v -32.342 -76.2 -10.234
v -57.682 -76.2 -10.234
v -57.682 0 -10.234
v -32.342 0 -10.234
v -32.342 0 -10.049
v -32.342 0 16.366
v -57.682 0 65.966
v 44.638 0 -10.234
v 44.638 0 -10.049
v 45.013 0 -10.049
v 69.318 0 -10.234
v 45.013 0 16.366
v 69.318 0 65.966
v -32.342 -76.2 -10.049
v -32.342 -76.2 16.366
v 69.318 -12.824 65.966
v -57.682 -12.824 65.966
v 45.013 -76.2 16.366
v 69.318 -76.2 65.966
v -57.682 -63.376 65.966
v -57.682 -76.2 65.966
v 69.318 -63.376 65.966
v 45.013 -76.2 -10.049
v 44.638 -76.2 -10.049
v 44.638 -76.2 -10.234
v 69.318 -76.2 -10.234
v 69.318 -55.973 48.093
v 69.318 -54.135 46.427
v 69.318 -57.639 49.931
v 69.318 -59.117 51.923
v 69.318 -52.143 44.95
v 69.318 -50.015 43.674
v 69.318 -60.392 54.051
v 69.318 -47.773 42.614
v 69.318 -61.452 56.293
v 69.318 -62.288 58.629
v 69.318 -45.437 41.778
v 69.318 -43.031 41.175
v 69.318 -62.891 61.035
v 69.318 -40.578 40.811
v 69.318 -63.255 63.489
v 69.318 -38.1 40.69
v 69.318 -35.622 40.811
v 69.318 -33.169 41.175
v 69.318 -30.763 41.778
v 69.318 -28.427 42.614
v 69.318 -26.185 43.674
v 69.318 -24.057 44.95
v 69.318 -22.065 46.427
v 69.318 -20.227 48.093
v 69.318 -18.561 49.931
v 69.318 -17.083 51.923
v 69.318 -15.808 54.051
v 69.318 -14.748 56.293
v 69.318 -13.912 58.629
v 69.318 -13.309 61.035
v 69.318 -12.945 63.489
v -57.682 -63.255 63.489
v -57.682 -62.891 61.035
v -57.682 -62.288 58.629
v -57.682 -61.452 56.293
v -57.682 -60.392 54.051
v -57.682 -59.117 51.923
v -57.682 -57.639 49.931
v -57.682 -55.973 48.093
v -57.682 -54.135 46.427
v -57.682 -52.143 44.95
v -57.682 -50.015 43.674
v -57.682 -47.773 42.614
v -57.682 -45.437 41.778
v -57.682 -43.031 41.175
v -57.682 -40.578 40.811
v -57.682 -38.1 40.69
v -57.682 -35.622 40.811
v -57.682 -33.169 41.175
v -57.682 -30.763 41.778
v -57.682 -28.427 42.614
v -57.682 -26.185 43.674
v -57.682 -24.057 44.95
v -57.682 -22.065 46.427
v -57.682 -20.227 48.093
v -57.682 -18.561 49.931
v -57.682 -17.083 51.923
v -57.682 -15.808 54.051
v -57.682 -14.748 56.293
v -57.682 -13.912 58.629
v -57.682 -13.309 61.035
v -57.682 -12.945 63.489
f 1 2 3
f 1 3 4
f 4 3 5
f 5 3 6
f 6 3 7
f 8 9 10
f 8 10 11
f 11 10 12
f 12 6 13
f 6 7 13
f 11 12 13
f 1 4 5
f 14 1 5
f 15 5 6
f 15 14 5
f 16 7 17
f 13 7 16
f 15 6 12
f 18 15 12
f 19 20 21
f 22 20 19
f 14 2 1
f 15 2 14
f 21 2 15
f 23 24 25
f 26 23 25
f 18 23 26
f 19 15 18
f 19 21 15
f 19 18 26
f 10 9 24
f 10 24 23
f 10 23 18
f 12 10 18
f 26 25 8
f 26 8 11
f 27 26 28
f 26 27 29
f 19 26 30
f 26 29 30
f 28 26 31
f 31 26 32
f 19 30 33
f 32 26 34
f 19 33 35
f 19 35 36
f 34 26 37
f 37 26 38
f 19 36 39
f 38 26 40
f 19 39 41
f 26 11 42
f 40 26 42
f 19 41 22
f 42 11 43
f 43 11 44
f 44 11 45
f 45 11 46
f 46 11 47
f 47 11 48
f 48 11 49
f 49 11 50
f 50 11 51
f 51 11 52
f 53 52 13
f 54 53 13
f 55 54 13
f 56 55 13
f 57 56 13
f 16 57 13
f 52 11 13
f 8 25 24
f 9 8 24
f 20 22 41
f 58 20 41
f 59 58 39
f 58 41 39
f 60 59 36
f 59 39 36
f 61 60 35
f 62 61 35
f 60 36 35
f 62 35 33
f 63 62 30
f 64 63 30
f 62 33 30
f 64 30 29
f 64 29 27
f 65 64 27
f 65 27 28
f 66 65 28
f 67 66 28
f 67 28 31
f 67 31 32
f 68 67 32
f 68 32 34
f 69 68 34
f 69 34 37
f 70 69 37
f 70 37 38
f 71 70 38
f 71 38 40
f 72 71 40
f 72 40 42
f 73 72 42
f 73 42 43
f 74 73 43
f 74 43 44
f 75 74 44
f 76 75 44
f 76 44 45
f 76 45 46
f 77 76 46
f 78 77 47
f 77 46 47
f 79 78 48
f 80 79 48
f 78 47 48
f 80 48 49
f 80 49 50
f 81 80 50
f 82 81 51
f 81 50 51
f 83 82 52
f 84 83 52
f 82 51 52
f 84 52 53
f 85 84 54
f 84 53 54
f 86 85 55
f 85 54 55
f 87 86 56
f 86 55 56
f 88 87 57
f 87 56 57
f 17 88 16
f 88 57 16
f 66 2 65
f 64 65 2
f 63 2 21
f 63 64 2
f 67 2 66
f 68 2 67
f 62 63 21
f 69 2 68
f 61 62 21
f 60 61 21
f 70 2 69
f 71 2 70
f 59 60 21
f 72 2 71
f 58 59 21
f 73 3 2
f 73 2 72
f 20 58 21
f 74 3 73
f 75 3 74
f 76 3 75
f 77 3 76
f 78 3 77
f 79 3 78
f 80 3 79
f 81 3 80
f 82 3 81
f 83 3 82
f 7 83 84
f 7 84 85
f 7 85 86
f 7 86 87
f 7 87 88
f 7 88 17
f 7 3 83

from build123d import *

# Parameters (mm, degrees)
F0_W     = 127
F0_H     = 76.2
F2_DEPTH = 76.2
F3_W     = 77.3548015118
F3_H     = 26.4147613198
F4_DEPTH = 88.138
F5_W     = 76.9804359138
F5_H     = 7.3428414762
F6_DEPTH = 93.98
F7_R     = 25.2764175419
F8_DEPTH = 142.494


with BuildPart() as f2:
    # F0 (on Front) → F2 (new body)
    with BuildSketch(Plane.XZ):
        with Locations((5.8183724284, 27.8661628202)):
            Rectangle(F0_W, F0_H)
    extrude(amount=F2_DEPTH)

    # F3 (on Front) → F4 (cut)
    with BuildSketch(Plane.XZ):
        with Locations((6.3353191733, 3.1585739926)):
            Rectangle(F3_W, F3_H)
    extrude(amount=F4_DEPTH, mode=Mode.SUBTRACT)

    # F5 (on face) → F6 (cut)
    with BuildSketch(Plane.XZ.offset(76.2)):
        with Locations((6.1481363744, -13.7202274054)):
            Rectangle(F5_W, F5_H)
    extrude(amount=-F6_DEPTH, mode=Mode.SUBTRACT)

    # F7 (on face) → F8 (cut)
    with BuildSketch(Plane.YZ.offset(69.3183724284)):
        with Locations((-38.1, 65.9661628202)):
            Circle(F7_R)
    extrude(amount=-F8_DEPTH, mode=Mode.SUBTRACT)


solid = f2.part
